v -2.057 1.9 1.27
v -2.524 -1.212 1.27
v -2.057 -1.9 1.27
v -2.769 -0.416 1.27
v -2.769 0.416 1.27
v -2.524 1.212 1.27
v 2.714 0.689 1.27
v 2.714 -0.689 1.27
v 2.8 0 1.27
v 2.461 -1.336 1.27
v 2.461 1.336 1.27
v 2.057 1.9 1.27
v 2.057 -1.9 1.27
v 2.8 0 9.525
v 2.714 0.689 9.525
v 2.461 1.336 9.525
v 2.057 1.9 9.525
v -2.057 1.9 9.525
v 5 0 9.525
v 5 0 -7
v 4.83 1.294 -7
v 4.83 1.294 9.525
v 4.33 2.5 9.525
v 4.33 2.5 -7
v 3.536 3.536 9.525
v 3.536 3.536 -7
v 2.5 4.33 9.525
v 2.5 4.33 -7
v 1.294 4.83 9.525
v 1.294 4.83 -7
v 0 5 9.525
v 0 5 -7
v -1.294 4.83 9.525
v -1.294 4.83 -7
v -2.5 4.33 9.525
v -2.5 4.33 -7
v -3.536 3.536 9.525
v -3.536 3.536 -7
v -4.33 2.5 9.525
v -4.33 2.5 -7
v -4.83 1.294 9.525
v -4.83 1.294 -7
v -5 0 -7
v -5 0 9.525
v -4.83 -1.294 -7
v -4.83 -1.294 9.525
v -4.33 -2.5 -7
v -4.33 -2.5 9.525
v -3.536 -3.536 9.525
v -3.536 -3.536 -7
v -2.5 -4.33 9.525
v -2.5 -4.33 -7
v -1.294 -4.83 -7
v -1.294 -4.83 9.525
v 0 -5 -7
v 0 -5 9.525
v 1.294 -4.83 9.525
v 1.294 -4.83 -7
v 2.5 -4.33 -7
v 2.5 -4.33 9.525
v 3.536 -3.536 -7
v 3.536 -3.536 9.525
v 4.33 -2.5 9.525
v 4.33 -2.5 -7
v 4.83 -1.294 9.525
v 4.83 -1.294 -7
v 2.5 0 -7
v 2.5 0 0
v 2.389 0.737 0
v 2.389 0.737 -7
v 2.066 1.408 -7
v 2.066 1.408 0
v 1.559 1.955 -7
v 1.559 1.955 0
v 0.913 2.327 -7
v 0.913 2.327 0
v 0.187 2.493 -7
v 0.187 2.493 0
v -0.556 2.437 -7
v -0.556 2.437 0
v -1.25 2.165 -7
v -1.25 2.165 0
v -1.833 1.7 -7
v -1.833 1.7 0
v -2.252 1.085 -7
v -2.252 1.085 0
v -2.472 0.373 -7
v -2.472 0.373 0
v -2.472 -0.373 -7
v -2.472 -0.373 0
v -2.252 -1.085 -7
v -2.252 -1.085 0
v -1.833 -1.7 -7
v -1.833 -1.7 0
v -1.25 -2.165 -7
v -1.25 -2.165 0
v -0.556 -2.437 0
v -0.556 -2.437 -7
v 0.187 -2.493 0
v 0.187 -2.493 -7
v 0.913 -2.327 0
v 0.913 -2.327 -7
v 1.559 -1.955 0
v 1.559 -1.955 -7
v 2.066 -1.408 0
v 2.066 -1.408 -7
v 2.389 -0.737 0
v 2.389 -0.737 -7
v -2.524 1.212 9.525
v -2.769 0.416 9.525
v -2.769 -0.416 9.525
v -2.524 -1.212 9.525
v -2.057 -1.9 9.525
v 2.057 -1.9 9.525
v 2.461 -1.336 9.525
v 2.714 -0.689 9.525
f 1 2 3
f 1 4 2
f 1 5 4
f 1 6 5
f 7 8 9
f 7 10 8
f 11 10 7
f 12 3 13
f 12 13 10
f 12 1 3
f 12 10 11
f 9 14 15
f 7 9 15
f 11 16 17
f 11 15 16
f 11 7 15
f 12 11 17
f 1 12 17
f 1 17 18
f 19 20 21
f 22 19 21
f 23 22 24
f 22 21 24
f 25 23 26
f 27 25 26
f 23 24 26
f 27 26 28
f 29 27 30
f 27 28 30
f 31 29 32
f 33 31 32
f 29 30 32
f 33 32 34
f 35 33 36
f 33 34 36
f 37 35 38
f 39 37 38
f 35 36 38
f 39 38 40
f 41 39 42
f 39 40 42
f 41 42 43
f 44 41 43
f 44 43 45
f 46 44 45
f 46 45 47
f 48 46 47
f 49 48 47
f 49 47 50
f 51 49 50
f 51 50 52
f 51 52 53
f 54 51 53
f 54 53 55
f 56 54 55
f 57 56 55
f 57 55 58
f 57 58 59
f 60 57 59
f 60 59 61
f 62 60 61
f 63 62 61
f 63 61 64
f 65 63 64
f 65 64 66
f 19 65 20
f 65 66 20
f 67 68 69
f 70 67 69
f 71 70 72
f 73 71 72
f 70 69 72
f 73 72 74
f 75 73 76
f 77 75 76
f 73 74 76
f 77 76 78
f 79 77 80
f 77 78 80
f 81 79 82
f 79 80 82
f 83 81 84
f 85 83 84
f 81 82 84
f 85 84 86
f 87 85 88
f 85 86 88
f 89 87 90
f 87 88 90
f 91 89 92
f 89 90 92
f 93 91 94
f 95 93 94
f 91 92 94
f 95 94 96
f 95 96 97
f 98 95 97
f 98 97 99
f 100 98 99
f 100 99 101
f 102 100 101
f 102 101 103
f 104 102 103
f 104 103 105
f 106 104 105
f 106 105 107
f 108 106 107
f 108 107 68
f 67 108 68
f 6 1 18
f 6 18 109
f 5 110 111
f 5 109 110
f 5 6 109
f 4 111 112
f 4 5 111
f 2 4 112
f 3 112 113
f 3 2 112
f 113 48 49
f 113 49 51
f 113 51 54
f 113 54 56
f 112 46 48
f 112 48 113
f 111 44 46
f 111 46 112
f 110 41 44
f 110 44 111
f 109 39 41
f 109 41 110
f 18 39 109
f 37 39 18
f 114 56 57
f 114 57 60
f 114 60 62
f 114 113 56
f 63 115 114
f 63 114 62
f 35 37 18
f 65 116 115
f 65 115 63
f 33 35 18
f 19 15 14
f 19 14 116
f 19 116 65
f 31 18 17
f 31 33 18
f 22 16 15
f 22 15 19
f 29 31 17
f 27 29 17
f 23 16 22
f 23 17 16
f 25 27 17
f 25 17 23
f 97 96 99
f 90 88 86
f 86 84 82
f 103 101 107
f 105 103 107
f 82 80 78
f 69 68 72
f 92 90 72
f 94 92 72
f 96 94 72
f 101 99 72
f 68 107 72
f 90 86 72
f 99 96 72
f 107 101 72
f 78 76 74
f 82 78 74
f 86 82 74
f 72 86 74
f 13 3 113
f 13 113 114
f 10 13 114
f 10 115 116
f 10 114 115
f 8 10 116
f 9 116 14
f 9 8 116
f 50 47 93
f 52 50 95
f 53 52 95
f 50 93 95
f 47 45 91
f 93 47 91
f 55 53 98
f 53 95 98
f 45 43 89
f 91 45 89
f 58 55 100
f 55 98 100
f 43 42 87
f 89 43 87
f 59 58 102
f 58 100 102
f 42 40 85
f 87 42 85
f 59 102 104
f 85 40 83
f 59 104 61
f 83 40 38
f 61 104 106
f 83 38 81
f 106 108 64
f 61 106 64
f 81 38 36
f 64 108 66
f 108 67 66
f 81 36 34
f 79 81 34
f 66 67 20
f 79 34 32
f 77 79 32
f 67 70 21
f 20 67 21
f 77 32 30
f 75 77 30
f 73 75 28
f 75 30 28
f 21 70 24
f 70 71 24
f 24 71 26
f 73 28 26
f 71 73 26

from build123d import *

# Parameters (mm, degrees)
F0_R          = 5
F1_DEPTH      = 9.525
F1_DEPTH_BACK = 7
F4_DEPTH      = 9.526
F3_R          = 2.5
F5_DEPTH      = 7.001
F6_DEPTH      = 1.27


with BuildPart() as f1:
    # F0 (on Top) → F1 (new body, two sides)
    with BuildSketch(Plane.XY) as f1_sk:
        Circle(F0_R)
    extrude(amount=F1_DEPTH)
    extrude(f1_sk.sketch, amount=-F1_DEPTH_BACK)

    # F2 (on Top) → F4 (cut, through all)
    with BuildSketch(Plane.XY):
        with BuildLine():
            ThreePointArc((2.056696, -1.9), (2.607561, -1.02011), (2.8, 0))
            ThreePointArc((2.8, 0), (2.607561, 1.02011), (2.056696, 1.9))
            Line((2.056696, 1.9), (-2.056696, 1.9))
            ThreePointArc((-2.056696, 1.9), (-2.8, 0), (-2.056696, -1.9))
            Line((-2.056696, -1.9), (2.056696, -1.9))
        make_face()
    extrude(amount=F4_DEPTH, mode=Mode.SUBTRACT)

    # F3 (on Top) → F5 (cut, through all)
    with BuildSketch(Plane.XY):
        Circle(F3_R)
    extrude(amount=-F5_DEPTH, mode=Mode.SUBTRACT)

    # F0 (on Top) → F6 (join)
    with BuildSketch(Plane.XY):
        Circle(F0_R)
    extrude(amount=F6_DEPTH)


solid = f1.part
